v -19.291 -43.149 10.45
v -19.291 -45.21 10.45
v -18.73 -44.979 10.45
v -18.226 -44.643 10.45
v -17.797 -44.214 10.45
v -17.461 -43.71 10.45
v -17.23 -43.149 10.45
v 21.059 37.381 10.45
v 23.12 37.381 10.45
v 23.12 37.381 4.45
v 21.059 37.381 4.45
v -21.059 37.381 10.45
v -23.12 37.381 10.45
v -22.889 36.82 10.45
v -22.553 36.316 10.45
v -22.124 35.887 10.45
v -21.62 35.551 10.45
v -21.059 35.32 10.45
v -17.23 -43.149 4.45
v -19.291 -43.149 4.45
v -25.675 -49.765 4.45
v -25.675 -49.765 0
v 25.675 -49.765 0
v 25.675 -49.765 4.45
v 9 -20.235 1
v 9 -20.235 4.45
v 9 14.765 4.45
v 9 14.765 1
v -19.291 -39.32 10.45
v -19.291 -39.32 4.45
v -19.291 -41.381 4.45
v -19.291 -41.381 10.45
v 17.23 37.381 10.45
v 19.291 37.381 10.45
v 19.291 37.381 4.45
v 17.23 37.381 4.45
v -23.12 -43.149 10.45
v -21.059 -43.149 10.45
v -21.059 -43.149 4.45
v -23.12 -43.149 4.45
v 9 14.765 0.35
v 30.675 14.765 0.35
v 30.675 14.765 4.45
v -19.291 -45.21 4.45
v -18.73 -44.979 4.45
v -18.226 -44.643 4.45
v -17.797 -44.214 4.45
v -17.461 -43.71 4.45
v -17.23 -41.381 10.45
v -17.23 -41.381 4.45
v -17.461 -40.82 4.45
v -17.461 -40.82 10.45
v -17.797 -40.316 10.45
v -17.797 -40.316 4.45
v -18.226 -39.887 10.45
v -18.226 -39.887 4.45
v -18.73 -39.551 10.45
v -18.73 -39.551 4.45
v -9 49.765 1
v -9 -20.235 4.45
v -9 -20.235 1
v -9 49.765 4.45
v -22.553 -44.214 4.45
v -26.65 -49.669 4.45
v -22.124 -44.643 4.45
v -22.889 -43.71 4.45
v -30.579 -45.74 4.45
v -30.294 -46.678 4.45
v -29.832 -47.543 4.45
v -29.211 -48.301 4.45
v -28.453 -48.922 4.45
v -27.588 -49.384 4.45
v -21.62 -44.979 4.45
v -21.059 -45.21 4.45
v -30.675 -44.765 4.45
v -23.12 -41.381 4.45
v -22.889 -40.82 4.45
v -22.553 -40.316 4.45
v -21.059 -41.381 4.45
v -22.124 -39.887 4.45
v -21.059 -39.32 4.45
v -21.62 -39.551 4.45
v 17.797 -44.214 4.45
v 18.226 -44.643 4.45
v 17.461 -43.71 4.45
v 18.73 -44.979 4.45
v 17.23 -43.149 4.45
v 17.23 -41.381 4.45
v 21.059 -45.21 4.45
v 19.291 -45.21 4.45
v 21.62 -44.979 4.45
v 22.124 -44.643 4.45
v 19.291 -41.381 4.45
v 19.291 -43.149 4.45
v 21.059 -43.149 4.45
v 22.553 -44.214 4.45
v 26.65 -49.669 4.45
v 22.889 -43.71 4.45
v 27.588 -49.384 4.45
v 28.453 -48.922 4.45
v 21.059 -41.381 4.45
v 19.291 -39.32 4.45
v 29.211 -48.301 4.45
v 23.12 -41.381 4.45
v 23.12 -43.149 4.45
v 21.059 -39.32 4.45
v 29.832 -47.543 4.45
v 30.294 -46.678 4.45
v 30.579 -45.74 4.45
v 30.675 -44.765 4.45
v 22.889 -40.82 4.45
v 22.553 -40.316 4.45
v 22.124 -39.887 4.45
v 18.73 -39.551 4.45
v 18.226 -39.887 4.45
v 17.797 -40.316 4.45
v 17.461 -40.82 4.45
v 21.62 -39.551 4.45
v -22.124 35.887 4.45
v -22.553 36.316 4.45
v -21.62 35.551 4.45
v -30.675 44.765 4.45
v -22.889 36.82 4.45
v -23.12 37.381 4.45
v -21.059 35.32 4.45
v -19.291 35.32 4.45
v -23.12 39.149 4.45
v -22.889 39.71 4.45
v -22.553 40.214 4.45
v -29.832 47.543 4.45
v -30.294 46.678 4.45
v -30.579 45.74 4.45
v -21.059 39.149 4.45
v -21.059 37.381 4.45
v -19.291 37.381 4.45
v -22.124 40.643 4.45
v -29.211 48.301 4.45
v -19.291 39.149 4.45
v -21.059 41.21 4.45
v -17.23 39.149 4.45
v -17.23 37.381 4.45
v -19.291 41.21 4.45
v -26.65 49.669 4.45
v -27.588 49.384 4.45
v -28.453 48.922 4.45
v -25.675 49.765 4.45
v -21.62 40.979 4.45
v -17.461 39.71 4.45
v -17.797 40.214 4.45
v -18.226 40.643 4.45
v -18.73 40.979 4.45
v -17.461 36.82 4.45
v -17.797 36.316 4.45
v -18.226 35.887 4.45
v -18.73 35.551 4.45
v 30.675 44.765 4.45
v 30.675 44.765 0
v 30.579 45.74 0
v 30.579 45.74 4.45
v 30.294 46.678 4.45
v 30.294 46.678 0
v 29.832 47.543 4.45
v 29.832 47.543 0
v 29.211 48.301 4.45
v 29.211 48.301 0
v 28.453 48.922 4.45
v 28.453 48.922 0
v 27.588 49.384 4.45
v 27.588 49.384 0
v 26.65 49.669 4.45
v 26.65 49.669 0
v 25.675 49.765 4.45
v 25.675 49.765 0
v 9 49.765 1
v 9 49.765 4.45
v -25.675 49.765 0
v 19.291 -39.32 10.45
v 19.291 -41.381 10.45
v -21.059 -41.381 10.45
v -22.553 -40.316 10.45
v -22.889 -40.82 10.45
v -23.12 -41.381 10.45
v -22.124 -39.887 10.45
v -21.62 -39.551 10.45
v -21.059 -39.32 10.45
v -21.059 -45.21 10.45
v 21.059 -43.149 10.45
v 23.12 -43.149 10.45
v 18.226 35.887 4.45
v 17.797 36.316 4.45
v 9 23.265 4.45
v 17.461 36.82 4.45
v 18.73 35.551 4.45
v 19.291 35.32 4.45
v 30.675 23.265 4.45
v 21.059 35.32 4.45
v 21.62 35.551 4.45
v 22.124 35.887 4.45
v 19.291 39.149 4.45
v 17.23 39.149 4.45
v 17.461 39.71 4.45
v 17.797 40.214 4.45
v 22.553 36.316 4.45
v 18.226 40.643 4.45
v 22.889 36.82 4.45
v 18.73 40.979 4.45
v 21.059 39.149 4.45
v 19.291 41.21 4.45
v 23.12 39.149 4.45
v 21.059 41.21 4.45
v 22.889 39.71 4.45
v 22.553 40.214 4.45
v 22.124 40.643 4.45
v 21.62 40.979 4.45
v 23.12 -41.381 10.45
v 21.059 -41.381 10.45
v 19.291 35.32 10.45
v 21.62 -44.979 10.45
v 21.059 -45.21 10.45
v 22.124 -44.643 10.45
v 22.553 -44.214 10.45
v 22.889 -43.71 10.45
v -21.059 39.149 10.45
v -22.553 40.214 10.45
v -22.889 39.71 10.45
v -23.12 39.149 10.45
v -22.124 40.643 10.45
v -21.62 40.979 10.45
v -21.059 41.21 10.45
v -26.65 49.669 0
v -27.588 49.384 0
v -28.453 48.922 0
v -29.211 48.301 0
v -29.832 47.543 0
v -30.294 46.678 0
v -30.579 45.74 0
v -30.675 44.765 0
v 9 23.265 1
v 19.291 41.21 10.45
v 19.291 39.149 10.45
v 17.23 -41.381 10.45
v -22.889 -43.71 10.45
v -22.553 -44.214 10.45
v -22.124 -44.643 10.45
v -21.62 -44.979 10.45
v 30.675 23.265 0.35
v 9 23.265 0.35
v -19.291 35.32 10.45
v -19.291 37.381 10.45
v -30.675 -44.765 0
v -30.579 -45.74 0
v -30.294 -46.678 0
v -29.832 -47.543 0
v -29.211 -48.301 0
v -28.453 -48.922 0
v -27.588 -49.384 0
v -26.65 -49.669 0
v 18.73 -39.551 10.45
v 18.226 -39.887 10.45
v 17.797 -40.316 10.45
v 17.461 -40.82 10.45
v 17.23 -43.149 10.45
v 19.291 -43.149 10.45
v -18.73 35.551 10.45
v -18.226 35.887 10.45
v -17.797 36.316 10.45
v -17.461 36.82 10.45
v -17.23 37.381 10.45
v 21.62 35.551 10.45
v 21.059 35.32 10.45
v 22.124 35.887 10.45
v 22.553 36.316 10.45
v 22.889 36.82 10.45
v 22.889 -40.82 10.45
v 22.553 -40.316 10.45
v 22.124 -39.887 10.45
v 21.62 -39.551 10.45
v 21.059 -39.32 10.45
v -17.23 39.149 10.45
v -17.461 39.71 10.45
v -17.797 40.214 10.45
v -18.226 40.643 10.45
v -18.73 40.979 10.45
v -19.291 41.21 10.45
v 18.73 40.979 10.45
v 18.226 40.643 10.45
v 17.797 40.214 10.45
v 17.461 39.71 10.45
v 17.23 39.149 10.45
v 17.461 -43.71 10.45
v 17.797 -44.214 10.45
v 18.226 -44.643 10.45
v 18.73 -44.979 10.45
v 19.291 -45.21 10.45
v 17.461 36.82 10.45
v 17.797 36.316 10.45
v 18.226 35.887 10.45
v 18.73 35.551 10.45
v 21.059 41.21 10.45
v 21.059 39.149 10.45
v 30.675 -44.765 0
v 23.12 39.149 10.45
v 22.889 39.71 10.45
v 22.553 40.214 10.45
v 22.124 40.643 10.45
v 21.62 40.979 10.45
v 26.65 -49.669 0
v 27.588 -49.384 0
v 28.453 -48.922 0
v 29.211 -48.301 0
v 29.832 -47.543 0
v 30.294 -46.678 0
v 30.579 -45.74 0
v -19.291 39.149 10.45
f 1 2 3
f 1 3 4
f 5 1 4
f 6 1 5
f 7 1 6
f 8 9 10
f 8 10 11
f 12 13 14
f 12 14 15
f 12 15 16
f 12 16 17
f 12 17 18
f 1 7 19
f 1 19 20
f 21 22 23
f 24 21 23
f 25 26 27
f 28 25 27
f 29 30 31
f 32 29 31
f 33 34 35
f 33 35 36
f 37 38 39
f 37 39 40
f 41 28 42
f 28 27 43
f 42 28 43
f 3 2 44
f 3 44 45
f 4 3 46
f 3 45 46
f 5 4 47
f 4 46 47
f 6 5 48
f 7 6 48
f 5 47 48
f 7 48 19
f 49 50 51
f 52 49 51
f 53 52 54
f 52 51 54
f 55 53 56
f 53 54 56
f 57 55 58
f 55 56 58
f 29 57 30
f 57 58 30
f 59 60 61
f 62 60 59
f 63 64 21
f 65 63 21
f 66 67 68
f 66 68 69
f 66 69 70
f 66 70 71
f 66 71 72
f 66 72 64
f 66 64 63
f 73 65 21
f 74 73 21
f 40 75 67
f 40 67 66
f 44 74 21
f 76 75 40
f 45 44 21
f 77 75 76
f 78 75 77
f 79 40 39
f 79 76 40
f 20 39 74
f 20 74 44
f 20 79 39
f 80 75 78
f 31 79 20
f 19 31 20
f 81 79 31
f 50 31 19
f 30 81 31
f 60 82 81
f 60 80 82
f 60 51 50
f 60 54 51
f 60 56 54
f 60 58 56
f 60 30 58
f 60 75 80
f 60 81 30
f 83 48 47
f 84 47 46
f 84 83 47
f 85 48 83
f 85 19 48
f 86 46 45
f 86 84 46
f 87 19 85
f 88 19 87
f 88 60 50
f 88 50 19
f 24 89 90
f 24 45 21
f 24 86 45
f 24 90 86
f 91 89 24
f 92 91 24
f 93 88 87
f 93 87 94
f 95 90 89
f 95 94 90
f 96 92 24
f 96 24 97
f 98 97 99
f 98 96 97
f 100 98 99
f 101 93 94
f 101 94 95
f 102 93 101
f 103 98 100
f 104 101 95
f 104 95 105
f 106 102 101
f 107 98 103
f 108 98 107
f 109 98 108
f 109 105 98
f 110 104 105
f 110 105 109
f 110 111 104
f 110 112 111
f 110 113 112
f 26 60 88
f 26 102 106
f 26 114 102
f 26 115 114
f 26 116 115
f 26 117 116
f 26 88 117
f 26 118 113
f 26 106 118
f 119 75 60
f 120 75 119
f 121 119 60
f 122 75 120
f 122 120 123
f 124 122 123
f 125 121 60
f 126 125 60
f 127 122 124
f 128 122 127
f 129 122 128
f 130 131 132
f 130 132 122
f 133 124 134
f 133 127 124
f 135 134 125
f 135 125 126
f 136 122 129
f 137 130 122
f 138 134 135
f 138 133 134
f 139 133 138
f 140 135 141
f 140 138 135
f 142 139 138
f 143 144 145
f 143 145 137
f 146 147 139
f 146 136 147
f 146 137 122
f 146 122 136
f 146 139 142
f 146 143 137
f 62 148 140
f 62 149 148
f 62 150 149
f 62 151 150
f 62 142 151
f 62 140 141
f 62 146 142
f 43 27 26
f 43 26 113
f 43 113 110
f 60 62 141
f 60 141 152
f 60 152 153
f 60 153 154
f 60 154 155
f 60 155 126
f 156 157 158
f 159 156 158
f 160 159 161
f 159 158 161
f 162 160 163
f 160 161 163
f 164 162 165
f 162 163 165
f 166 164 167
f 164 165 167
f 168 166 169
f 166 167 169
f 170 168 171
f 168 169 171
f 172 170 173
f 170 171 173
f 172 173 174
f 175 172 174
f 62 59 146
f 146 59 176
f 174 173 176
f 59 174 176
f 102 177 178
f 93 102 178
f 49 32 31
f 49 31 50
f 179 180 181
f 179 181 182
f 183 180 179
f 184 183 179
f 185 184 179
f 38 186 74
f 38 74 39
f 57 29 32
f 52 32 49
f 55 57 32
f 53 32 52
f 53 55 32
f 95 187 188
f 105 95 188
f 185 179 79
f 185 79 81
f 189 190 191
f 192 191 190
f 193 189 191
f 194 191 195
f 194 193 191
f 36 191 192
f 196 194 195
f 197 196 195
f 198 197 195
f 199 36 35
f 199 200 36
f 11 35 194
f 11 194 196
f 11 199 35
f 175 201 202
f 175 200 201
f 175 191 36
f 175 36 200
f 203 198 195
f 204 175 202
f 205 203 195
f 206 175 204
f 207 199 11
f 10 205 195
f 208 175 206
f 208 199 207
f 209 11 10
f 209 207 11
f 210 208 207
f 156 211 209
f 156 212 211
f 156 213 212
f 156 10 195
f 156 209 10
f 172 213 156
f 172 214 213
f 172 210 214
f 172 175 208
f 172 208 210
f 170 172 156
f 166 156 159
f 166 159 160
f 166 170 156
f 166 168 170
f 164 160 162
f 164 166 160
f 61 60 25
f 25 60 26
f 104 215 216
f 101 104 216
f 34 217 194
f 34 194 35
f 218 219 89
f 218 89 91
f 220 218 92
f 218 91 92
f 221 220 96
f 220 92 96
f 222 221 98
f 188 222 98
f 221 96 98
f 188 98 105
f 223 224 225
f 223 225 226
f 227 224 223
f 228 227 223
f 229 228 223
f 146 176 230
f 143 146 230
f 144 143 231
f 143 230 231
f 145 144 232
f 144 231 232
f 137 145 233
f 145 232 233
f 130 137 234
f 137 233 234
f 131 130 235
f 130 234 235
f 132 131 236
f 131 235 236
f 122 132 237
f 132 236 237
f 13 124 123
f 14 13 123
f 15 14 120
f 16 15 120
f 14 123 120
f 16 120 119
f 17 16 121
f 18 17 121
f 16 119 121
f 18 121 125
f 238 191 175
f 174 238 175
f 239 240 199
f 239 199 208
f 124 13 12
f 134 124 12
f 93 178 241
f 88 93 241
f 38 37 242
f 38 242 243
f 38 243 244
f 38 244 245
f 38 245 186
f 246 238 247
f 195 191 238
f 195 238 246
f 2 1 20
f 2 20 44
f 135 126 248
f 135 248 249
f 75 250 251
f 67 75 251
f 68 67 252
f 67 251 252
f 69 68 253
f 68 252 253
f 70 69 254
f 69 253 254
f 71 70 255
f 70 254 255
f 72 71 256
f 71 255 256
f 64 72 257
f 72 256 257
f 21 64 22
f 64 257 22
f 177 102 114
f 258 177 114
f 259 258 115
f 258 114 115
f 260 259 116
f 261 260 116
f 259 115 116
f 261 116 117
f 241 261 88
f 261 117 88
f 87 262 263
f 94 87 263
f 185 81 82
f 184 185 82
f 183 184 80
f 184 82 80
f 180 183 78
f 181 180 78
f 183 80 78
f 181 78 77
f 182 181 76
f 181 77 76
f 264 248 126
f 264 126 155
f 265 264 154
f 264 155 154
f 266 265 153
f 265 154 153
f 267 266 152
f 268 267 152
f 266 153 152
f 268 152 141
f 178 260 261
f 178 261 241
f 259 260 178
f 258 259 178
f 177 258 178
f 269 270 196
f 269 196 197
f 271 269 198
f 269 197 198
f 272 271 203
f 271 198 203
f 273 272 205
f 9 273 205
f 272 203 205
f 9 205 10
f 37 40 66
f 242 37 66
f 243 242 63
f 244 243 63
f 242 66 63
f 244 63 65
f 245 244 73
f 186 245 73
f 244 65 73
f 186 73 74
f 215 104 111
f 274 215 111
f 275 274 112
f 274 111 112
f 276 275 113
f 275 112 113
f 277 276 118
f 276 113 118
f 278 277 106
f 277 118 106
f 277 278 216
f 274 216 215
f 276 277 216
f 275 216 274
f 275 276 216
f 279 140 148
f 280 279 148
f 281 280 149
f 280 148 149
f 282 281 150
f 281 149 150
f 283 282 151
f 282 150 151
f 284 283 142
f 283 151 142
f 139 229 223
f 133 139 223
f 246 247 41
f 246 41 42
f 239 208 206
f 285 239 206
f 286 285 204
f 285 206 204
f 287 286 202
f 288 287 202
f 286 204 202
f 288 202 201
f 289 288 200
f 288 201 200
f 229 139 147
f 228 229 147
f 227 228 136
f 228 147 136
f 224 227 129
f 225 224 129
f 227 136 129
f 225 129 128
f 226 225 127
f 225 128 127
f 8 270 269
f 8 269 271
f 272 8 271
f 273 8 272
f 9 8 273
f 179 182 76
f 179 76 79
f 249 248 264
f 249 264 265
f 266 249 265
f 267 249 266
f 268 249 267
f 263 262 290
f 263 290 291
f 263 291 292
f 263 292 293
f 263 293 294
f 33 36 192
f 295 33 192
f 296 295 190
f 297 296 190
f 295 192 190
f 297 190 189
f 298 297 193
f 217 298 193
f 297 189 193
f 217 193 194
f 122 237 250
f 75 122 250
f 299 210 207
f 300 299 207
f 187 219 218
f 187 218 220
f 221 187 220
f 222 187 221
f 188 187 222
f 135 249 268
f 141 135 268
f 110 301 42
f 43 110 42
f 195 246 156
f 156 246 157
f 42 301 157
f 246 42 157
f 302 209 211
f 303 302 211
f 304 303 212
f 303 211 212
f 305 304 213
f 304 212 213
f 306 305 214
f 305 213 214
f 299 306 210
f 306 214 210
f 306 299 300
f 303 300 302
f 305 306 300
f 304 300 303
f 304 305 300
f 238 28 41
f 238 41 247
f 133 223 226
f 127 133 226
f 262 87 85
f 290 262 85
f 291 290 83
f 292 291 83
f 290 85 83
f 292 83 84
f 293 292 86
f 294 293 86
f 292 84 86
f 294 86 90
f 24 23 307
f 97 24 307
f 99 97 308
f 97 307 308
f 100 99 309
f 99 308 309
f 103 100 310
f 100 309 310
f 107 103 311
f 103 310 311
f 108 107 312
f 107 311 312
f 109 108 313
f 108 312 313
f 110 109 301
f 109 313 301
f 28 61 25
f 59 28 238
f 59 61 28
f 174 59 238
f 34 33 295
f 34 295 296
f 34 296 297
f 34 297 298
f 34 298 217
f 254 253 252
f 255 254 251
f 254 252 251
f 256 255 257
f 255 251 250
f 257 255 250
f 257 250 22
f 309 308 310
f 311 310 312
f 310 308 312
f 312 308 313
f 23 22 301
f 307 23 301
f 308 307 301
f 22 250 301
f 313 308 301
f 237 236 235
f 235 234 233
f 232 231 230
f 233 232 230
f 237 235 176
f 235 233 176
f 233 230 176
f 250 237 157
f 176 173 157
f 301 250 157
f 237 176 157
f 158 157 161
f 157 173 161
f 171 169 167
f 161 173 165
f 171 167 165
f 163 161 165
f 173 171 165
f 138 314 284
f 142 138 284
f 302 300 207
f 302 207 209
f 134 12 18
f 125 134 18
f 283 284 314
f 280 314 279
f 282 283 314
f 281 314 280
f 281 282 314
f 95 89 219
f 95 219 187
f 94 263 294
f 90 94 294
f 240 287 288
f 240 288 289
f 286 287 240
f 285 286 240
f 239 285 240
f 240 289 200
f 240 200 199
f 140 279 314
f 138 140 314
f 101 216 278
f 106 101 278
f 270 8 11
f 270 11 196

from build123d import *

# Parameters (mm, degrees)
PAD_DEPTH       = 4.45
SKETCH001_W     = 18
SKETCH001_H     = 70
POCKET_DEPTH    = 3.45
SKETCH002_R     = 3.075
PAD001_DEPTH    = 6
POCKET001_DEPTH = 6
SKETCH004_W     = 21.675
SKETCH004_H     = 8.5
POCKET002_DEPTH = 4.1


with BuildPart() as part:
    # Sketch → Pad (new body)
    with BuildSketch(Plane.XY):
        with BuildLine():
            Line((-30.675, 44.765), (-30.675, -44.765))
            ThreePointArc((-30.675, -44.765), (-29.210534, -48.300534), (-25.675, -49.765))
            Line((-25.675, -49.765), (25.675, -49.765))
            ThreePointArc((25.675, -49.765), (29.210534, -48.300534), (30.675, -44.765))
            Line((30.675, -44.765), (30.675, 44.765))
            ThreePointArc((30.675, 44.765), (29.210534, 48.300534), (25.675, 49.765))
            Line((25.675, 49.765), (-25.675, 49.765))
            ThreePointArc((-25.675, 49.765), (-29.210534, 48.300534), (-30.675, 44.765))
        make_face()
    extrude(amount=PAD_DEPTH)

    # Sketch001 (on Face10 of Pad) → Pocket (cut)
    with BuildSketch(Plane.XY.offset(4.45)):
        with Locations((0, 14.765)):
            Rectangle(SKETCH001_W, SKETCH001_H)
    extrude(amount=-POCKET_DEPTH, mode=Mode.SUBTRACT)

    # Sketch002 (on Face5 of Pocket) → Pad001 (join)
    with BuildSketch(Plane.XY.offset(4.45)):
        with Locations((-20.175, 38.265)):
            Circle(SKETCH002_R)
        with Locations((20.175, 38.265)):
            Circle(SKETCH002_R)
        with Locations((-20.175, -42.265)):
            Circle(SKETCH002_R)
        with Locations((20.175, -42.265)):
            Circle(SKETCH002_R)
    extrude(amount=PAD001_DEPTH)

    # Sketch003 (on Face21 of Pad001) → Pocket001 (cut)
    with BuildSketch(Plane.XY.offset(10.45)):
        Polygon((-21.058883, 42.348883), (-21.058883, 39.148883), (-24.258883, 39.148883), (-24.258883, 37.381117), (-21.058883, 37.381117), (-21.058883, 34.181117), (-19.291117, 34.181117), (-19.291117, 37.381117), (-16.091117, 37.381117), (-16.091117, 39.148883), (-19.291117, 39.148883), (-19.291117, 42.348883), align=None)
        Polygon((21.058883, 42.348883), (21.058883, 39.148883), (24.258883, 39.148883), (24.258883, 37.381117), (21.058883, 37.381117), (21.058883, 34.181117), (19.291117, 34.181117), (19.291117, 37.381117), (16.091117, 37.381117), (16.091117, 39.148883), (19.291117, 39.148883), (19.291117, 42.348883), align=None)
        Polygon((-21.058883, -46.508146), (-21.058883, -43.148883), (-24.418146, -43.148883), (-24.418146, -41.381117), (-21.058883, -41.381117), (-21.058883, -38.021854), (-19.291117, -38.021854), (-19.291117, -41.381117), (-15.931854, -41.381117), (-15.931854, -43.148883), (-19.291117, -43.148883), (-19.291117, -46.508146), align=None)
        Polygon((21.058883, -47.109884), (21.058883, -43.148883), (25.019884, -43.148883), (25.019884, -41.381117), (21.058883, -41.381117), (21.058883, -37.420116), (19.291117, -37.420116), (19.291117, -41.381117), (15.330116, -41.381117), (15.330116, -43.148883), (19.291117, -43.148883), (19.291117, -47.109884), align=None)
    extrude(amount=-POCKET001_DEPTH, mode=Mode.SUBTRACT)

    # Sketch004 (on Face14 of Pocket001) → Pocket002 (cut)
    with BuildSketch(Plane.XY.offset(4.45)):
        with Locations((19.8375, 19.015)):
            Rectangle(SKETCH004_W, SKETCH004_H)
    extrude(amount=-POCKET002_DEPTH, mode=Mode.SUBTRACT)


solid = part.part
